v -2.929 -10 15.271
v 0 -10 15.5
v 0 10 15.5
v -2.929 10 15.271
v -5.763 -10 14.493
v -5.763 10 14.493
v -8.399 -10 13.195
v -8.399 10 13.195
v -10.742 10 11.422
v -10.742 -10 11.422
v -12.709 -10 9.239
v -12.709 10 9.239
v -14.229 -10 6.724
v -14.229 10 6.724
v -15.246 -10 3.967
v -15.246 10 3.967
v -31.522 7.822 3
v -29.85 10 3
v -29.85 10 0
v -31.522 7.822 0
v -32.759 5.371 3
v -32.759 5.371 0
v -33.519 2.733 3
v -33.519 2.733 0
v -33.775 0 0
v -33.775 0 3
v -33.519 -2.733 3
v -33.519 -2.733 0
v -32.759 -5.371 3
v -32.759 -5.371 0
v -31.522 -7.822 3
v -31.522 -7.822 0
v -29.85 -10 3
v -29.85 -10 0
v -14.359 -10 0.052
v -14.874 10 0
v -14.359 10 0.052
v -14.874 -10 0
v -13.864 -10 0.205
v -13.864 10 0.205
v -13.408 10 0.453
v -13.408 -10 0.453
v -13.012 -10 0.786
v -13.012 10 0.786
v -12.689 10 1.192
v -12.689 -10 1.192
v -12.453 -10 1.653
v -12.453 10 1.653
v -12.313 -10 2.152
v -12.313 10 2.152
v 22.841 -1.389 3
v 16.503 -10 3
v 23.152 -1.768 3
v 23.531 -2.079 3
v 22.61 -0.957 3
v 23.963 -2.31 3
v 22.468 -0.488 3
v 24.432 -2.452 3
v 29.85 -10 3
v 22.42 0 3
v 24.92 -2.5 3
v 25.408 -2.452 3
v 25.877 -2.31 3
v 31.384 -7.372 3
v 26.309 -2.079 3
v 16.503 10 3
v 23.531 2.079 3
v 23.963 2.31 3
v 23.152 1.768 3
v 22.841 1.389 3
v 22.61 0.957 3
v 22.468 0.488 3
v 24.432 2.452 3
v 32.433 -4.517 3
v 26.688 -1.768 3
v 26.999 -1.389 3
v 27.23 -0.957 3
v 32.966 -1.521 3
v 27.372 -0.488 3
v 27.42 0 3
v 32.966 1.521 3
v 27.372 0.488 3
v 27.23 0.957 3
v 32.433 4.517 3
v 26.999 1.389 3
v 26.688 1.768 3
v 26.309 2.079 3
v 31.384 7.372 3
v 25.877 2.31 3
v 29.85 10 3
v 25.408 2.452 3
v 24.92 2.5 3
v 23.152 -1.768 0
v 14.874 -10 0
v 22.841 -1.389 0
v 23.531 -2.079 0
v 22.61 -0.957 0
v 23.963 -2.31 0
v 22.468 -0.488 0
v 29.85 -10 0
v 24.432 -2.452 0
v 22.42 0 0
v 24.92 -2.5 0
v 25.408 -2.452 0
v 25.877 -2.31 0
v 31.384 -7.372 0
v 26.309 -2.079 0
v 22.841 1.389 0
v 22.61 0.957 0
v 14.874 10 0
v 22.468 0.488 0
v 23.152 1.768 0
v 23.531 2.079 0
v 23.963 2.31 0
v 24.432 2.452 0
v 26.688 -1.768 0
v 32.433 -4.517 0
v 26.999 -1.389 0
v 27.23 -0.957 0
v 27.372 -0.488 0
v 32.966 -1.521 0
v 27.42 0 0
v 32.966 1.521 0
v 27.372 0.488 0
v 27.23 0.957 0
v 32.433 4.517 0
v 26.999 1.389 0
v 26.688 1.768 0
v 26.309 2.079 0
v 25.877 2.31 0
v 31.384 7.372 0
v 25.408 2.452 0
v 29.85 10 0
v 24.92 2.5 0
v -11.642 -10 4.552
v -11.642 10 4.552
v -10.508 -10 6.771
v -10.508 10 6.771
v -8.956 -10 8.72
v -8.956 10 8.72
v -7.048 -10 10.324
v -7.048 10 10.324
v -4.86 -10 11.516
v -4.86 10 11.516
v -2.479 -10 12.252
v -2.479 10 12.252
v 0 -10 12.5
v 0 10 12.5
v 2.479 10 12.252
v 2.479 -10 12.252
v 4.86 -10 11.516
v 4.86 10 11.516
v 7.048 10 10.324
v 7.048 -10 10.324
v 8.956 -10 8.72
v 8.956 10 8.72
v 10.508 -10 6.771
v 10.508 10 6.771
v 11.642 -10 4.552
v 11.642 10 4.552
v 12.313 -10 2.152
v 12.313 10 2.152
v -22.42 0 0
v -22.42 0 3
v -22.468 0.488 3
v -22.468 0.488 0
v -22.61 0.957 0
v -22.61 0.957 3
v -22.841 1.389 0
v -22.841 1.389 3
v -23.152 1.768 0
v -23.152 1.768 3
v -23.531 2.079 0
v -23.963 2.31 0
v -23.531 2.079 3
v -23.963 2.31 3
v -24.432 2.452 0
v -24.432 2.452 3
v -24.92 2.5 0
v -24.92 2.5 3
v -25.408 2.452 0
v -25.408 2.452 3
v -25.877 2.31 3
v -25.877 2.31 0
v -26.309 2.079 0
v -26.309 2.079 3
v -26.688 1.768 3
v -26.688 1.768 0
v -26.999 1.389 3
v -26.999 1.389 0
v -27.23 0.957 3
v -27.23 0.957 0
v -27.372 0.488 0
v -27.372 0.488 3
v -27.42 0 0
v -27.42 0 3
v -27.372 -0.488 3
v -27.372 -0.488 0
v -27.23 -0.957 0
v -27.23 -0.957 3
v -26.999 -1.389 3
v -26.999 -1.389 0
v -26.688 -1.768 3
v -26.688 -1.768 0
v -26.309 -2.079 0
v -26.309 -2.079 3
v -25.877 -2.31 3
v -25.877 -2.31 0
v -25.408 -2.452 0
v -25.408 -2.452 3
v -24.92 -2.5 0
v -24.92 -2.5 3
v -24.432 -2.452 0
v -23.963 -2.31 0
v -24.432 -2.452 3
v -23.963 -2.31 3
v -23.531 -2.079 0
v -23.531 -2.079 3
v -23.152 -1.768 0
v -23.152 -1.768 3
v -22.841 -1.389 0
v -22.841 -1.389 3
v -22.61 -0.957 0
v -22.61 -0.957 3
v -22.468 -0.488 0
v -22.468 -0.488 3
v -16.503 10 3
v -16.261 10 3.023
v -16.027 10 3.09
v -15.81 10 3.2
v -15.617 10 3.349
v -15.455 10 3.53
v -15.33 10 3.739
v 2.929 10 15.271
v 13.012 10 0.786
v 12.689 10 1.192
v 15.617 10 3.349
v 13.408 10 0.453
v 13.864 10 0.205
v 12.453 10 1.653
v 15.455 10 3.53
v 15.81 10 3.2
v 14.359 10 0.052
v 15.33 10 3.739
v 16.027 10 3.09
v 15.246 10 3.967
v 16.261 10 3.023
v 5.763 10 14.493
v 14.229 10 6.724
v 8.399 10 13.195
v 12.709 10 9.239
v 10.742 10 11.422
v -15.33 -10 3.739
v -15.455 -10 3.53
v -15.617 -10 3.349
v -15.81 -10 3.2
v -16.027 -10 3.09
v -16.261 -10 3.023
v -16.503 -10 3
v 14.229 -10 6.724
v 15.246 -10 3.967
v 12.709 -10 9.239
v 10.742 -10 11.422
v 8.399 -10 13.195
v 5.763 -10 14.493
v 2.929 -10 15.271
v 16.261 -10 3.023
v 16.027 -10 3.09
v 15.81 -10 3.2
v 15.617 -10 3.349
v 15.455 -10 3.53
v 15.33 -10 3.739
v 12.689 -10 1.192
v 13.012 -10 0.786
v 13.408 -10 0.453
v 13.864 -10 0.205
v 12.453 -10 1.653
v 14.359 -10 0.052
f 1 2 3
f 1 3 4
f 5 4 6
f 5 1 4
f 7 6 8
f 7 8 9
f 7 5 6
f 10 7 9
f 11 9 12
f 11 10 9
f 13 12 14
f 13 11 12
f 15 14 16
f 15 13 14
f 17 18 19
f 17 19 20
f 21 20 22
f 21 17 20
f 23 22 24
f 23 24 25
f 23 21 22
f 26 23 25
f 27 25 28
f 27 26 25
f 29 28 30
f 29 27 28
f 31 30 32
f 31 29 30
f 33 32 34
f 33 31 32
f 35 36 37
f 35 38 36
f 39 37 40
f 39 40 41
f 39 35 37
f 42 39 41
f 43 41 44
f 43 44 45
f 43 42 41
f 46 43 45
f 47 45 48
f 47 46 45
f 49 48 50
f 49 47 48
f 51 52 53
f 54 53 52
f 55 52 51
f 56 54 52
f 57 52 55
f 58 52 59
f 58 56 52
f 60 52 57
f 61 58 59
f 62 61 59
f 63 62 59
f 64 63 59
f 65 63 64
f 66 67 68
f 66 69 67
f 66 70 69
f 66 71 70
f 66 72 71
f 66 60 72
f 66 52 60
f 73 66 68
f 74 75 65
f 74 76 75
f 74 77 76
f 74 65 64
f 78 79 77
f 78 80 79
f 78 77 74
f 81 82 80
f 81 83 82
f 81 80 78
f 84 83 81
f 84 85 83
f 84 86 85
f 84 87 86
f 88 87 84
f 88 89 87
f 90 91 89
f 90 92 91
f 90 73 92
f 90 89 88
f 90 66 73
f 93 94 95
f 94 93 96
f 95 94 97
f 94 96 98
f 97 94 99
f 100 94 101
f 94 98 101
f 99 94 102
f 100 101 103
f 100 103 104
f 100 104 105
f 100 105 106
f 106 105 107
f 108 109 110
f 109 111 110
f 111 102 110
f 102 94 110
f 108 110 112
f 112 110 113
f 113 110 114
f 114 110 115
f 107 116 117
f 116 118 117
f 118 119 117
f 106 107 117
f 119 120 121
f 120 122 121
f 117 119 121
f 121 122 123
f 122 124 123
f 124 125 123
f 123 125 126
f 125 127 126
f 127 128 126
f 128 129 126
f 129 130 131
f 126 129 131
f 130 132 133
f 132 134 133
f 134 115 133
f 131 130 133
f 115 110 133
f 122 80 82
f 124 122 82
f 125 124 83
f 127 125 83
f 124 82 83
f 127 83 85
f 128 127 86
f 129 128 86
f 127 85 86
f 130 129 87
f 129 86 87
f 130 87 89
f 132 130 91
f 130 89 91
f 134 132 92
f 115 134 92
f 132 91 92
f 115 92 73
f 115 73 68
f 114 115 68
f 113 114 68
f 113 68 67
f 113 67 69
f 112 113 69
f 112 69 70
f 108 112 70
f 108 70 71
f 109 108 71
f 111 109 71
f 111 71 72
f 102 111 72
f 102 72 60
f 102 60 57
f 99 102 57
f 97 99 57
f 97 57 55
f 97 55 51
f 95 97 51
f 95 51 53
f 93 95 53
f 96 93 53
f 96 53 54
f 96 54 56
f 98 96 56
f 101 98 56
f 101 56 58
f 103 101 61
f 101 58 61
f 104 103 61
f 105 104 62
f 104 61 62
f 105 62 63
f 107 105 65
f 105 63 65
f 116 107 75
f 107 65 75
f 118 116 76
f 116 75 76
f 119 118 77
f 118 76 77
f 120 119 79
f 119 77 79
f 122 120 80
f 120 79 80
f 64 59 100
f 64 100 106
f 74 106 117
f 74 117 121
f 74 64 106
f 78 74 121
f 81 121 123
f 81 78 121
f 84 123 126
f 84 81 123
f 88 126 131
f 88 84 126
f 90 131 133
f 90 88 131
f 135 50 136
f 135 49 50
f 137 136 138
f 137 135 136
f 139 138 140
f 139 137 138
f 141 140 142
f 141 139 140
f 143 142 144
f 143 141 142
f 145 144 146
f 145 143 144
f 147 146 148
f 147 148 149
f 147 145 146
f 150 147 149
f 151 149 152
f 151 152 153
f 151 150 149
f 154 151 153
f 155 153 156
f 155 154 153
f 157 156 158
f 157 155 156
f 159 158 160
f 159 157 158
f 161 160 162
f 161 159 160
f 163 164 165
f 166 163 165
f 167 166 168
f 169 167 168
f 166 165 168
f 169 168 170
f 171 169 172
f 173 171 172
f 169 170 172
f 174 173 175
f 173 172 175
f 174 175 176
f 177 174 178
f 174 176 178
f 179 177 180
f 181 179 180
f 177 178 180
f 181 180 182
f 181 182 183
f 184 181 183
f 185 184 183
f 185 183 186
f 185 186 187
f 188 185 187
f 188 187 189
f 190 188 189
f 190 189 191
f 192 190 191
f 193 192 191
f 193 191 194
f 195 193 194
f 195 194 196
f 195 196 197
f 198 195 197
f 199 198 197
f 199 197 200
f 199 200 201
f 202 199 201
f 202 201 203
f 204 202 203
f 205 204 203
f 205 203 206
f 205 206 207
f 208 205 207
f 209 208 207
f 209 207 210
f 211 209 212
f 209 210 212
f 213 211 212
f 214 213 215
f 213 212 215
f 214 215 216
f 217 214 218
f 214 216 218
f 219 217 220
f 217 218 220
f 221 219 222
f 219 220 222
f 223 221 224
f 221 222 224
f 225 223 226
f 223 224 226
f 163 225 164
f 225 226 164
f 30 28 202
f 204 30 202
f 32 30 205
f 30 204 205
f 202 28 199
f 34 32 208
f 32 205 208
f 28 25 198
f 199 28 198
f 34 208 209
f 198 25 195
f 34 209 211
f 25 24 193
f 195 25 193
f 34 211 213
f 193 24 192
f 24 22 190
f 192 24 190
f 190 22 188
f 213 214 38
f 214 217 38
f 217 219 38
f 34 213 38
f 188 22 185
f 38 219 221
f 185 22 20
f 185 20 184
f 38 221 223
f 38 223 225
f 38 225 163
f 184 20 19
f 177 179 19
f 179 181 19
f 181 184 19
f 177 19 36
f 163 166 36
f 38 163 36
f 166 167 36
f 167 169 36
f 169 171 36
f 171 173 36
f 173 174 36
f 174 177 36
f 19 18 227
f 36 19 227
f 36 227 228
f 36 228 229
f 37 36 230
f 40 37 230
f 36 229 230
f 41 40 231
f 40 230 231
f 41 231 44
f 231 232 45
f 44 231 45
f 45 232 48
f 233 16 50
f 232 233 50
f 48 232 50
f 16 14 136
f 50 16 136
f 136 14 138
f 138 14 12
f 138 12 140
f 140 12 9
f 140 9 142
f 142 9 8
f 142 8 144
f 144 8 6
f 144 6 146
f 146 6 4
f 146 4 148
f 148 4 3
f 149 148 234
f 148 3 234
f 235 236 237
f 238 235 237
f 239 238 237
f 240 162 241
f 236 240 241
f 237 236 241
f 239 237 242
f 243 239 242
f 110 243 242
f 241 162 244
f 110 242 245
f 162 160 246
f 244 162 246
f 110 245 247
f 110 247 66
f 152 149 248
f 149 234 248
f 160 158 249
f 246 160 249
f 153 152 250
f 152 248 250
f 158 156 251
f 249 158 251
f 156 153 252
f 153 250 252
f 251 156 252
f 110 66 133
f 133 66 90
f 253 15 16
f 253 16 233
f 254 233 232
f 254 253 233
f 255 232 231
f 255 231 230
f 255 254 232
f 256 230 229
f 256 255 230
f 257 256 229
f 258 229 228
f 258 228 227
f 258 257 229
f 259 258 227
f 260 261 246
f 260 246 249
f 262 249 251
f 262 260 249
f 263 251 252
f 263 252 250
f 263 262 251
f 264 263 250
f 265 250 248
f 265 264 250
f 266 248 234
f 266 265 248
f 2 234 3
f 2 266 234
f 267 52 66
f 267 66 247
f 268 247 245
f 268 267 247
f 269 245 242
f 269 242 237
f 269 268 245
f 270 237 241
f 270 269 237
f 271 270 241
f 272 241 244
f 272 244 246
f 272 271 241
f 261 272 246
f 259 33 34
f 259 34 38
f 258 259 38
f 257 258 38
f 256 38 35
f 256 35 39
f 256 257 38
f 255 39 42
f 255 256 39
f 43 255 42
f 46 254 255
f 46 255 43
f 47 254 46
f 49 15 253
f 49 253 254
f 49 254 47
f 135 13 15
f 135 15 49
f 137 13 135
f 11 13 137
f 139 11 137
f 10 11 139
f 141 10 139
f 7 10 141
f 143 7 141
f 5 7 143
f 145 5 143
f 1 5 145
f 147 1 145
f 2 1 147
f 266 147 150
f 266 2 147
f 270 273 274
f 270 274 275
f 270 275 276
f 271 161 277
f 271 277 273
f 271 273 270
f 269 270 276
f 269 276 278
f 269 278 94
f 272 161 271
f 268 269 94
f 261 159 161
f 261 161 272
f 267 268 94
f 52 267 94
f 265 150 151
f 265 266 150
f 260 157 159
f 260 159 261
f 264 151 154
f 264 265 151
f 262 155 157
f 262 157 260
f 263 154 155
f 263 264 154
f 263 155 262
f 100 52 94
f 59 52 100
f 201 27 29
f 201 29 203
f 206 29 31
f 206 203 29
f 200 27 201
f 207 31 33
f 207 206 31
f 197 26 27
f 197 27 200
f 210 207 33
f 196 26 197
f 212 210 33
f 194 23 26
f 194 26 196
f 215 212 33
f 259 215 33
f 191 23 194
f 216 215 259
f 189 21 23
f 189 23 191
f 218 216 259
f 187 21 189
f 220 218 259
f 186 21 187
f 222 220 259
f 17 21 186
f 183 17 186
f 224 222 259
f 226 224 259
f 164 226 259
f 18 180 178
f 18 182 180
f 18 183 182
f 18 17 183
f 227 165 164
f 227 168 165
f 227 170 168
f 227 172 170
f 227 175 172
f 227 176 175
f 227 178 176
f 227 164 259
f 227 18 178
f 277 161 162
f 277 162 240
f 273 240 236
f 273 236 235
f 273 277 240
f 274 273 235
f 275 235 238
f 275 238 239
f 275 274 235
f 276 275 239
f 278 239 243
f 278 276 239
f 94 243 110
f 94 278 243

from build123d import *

# Parameters (mm, degrees)
F1_DEPTH = 10
F2_R     = 2.5
F3_DEPTH = 25
F5_DEPTH = 3
F7_DEPTH = 3


with BuildPart() as f1:
    # F0 (on Front) → F1 (new body, symmetric)
    with BuildSketch(Plane.XZ):
        with BuildLine():
            ThreePointArc((-12.3133069376, 2.1523178808), (0, 12.5), (12.3133069376, 2.1523178808))
            ThreePointArc((12.3133069376, 2.1523178808), (13.2017484895, 0.6095259974), (14.8744747806, 0))
            Line((14.8744747806, 0), (29.85, 0))
            Line((29.85, 0), (29.85, 3))
            Line((29.85, 3), (16.503, 3))
            ThreePointArc((16.503, 3), (15.7100109406, 3.2698697404), (15.2462584222, 3.9674333051))
            ThreePointArc((15.2462584222, 3.9674333051), (9.6127418909, 12.3640200256), (0, 15.5))
            ThreePointArc((0, 15.5), (-9.6127418909, 12.3640200256), (-15.2462584222, 3.9674333051))
            ThreePointArc((-15.2462584222, 3.9674333051), (-15.7100109406, 3.2698697404), (-16.503, 3))
            Line((-16.503, 3), (-29.85, 3))
            Line((-29.85, 3), (-29.85, 0))
            Line((-29.85, 0), (-14.8744747806, 0))
            ThreePointArc((-14.8744747806, 0), (-13.2017484895, 0.6095259974), (-12.3133069376, 2.1523178808))
        make_face()
    extrude(amount=F1_DEPTH, both=True)

    # F2 (on face) → F3 (cut)
    with BuildSketch(Plane.XY.offset(3)):
        with Locations((24.92, 0)):
            Circle(F2_R)
        with Locations((-24.92, 0)):
            Circle(F2_R)
    extrude(amount=-F3_DEPTH, mode=Mode.SUBTRACT)

    # F4 (on face) → F5 (join)
    with BuildSketch(Plane.XY.offset(3)):
        with BuildLine():
            Line((-29.85, -10), (-29.85, 10))
            ThreePointArc((-29.85, 10), (-33.7754930507, 0), (-29.85, -10))
        make_face()
    extrude(amount=-F5_DEPTH)

    # F6 (on face) → F7 (join)
    with BuildSketch(Plane.XY.offset(3)):
        with BuildLine():
            Line((29.85, 10), (29.85, -10))
            ThreePointArc((29.85, -10), (33.0329889849, 0), (29.85, 10))
        make_face()
    extrude(amount=-F7_DEPTH)


solid = f1.part
